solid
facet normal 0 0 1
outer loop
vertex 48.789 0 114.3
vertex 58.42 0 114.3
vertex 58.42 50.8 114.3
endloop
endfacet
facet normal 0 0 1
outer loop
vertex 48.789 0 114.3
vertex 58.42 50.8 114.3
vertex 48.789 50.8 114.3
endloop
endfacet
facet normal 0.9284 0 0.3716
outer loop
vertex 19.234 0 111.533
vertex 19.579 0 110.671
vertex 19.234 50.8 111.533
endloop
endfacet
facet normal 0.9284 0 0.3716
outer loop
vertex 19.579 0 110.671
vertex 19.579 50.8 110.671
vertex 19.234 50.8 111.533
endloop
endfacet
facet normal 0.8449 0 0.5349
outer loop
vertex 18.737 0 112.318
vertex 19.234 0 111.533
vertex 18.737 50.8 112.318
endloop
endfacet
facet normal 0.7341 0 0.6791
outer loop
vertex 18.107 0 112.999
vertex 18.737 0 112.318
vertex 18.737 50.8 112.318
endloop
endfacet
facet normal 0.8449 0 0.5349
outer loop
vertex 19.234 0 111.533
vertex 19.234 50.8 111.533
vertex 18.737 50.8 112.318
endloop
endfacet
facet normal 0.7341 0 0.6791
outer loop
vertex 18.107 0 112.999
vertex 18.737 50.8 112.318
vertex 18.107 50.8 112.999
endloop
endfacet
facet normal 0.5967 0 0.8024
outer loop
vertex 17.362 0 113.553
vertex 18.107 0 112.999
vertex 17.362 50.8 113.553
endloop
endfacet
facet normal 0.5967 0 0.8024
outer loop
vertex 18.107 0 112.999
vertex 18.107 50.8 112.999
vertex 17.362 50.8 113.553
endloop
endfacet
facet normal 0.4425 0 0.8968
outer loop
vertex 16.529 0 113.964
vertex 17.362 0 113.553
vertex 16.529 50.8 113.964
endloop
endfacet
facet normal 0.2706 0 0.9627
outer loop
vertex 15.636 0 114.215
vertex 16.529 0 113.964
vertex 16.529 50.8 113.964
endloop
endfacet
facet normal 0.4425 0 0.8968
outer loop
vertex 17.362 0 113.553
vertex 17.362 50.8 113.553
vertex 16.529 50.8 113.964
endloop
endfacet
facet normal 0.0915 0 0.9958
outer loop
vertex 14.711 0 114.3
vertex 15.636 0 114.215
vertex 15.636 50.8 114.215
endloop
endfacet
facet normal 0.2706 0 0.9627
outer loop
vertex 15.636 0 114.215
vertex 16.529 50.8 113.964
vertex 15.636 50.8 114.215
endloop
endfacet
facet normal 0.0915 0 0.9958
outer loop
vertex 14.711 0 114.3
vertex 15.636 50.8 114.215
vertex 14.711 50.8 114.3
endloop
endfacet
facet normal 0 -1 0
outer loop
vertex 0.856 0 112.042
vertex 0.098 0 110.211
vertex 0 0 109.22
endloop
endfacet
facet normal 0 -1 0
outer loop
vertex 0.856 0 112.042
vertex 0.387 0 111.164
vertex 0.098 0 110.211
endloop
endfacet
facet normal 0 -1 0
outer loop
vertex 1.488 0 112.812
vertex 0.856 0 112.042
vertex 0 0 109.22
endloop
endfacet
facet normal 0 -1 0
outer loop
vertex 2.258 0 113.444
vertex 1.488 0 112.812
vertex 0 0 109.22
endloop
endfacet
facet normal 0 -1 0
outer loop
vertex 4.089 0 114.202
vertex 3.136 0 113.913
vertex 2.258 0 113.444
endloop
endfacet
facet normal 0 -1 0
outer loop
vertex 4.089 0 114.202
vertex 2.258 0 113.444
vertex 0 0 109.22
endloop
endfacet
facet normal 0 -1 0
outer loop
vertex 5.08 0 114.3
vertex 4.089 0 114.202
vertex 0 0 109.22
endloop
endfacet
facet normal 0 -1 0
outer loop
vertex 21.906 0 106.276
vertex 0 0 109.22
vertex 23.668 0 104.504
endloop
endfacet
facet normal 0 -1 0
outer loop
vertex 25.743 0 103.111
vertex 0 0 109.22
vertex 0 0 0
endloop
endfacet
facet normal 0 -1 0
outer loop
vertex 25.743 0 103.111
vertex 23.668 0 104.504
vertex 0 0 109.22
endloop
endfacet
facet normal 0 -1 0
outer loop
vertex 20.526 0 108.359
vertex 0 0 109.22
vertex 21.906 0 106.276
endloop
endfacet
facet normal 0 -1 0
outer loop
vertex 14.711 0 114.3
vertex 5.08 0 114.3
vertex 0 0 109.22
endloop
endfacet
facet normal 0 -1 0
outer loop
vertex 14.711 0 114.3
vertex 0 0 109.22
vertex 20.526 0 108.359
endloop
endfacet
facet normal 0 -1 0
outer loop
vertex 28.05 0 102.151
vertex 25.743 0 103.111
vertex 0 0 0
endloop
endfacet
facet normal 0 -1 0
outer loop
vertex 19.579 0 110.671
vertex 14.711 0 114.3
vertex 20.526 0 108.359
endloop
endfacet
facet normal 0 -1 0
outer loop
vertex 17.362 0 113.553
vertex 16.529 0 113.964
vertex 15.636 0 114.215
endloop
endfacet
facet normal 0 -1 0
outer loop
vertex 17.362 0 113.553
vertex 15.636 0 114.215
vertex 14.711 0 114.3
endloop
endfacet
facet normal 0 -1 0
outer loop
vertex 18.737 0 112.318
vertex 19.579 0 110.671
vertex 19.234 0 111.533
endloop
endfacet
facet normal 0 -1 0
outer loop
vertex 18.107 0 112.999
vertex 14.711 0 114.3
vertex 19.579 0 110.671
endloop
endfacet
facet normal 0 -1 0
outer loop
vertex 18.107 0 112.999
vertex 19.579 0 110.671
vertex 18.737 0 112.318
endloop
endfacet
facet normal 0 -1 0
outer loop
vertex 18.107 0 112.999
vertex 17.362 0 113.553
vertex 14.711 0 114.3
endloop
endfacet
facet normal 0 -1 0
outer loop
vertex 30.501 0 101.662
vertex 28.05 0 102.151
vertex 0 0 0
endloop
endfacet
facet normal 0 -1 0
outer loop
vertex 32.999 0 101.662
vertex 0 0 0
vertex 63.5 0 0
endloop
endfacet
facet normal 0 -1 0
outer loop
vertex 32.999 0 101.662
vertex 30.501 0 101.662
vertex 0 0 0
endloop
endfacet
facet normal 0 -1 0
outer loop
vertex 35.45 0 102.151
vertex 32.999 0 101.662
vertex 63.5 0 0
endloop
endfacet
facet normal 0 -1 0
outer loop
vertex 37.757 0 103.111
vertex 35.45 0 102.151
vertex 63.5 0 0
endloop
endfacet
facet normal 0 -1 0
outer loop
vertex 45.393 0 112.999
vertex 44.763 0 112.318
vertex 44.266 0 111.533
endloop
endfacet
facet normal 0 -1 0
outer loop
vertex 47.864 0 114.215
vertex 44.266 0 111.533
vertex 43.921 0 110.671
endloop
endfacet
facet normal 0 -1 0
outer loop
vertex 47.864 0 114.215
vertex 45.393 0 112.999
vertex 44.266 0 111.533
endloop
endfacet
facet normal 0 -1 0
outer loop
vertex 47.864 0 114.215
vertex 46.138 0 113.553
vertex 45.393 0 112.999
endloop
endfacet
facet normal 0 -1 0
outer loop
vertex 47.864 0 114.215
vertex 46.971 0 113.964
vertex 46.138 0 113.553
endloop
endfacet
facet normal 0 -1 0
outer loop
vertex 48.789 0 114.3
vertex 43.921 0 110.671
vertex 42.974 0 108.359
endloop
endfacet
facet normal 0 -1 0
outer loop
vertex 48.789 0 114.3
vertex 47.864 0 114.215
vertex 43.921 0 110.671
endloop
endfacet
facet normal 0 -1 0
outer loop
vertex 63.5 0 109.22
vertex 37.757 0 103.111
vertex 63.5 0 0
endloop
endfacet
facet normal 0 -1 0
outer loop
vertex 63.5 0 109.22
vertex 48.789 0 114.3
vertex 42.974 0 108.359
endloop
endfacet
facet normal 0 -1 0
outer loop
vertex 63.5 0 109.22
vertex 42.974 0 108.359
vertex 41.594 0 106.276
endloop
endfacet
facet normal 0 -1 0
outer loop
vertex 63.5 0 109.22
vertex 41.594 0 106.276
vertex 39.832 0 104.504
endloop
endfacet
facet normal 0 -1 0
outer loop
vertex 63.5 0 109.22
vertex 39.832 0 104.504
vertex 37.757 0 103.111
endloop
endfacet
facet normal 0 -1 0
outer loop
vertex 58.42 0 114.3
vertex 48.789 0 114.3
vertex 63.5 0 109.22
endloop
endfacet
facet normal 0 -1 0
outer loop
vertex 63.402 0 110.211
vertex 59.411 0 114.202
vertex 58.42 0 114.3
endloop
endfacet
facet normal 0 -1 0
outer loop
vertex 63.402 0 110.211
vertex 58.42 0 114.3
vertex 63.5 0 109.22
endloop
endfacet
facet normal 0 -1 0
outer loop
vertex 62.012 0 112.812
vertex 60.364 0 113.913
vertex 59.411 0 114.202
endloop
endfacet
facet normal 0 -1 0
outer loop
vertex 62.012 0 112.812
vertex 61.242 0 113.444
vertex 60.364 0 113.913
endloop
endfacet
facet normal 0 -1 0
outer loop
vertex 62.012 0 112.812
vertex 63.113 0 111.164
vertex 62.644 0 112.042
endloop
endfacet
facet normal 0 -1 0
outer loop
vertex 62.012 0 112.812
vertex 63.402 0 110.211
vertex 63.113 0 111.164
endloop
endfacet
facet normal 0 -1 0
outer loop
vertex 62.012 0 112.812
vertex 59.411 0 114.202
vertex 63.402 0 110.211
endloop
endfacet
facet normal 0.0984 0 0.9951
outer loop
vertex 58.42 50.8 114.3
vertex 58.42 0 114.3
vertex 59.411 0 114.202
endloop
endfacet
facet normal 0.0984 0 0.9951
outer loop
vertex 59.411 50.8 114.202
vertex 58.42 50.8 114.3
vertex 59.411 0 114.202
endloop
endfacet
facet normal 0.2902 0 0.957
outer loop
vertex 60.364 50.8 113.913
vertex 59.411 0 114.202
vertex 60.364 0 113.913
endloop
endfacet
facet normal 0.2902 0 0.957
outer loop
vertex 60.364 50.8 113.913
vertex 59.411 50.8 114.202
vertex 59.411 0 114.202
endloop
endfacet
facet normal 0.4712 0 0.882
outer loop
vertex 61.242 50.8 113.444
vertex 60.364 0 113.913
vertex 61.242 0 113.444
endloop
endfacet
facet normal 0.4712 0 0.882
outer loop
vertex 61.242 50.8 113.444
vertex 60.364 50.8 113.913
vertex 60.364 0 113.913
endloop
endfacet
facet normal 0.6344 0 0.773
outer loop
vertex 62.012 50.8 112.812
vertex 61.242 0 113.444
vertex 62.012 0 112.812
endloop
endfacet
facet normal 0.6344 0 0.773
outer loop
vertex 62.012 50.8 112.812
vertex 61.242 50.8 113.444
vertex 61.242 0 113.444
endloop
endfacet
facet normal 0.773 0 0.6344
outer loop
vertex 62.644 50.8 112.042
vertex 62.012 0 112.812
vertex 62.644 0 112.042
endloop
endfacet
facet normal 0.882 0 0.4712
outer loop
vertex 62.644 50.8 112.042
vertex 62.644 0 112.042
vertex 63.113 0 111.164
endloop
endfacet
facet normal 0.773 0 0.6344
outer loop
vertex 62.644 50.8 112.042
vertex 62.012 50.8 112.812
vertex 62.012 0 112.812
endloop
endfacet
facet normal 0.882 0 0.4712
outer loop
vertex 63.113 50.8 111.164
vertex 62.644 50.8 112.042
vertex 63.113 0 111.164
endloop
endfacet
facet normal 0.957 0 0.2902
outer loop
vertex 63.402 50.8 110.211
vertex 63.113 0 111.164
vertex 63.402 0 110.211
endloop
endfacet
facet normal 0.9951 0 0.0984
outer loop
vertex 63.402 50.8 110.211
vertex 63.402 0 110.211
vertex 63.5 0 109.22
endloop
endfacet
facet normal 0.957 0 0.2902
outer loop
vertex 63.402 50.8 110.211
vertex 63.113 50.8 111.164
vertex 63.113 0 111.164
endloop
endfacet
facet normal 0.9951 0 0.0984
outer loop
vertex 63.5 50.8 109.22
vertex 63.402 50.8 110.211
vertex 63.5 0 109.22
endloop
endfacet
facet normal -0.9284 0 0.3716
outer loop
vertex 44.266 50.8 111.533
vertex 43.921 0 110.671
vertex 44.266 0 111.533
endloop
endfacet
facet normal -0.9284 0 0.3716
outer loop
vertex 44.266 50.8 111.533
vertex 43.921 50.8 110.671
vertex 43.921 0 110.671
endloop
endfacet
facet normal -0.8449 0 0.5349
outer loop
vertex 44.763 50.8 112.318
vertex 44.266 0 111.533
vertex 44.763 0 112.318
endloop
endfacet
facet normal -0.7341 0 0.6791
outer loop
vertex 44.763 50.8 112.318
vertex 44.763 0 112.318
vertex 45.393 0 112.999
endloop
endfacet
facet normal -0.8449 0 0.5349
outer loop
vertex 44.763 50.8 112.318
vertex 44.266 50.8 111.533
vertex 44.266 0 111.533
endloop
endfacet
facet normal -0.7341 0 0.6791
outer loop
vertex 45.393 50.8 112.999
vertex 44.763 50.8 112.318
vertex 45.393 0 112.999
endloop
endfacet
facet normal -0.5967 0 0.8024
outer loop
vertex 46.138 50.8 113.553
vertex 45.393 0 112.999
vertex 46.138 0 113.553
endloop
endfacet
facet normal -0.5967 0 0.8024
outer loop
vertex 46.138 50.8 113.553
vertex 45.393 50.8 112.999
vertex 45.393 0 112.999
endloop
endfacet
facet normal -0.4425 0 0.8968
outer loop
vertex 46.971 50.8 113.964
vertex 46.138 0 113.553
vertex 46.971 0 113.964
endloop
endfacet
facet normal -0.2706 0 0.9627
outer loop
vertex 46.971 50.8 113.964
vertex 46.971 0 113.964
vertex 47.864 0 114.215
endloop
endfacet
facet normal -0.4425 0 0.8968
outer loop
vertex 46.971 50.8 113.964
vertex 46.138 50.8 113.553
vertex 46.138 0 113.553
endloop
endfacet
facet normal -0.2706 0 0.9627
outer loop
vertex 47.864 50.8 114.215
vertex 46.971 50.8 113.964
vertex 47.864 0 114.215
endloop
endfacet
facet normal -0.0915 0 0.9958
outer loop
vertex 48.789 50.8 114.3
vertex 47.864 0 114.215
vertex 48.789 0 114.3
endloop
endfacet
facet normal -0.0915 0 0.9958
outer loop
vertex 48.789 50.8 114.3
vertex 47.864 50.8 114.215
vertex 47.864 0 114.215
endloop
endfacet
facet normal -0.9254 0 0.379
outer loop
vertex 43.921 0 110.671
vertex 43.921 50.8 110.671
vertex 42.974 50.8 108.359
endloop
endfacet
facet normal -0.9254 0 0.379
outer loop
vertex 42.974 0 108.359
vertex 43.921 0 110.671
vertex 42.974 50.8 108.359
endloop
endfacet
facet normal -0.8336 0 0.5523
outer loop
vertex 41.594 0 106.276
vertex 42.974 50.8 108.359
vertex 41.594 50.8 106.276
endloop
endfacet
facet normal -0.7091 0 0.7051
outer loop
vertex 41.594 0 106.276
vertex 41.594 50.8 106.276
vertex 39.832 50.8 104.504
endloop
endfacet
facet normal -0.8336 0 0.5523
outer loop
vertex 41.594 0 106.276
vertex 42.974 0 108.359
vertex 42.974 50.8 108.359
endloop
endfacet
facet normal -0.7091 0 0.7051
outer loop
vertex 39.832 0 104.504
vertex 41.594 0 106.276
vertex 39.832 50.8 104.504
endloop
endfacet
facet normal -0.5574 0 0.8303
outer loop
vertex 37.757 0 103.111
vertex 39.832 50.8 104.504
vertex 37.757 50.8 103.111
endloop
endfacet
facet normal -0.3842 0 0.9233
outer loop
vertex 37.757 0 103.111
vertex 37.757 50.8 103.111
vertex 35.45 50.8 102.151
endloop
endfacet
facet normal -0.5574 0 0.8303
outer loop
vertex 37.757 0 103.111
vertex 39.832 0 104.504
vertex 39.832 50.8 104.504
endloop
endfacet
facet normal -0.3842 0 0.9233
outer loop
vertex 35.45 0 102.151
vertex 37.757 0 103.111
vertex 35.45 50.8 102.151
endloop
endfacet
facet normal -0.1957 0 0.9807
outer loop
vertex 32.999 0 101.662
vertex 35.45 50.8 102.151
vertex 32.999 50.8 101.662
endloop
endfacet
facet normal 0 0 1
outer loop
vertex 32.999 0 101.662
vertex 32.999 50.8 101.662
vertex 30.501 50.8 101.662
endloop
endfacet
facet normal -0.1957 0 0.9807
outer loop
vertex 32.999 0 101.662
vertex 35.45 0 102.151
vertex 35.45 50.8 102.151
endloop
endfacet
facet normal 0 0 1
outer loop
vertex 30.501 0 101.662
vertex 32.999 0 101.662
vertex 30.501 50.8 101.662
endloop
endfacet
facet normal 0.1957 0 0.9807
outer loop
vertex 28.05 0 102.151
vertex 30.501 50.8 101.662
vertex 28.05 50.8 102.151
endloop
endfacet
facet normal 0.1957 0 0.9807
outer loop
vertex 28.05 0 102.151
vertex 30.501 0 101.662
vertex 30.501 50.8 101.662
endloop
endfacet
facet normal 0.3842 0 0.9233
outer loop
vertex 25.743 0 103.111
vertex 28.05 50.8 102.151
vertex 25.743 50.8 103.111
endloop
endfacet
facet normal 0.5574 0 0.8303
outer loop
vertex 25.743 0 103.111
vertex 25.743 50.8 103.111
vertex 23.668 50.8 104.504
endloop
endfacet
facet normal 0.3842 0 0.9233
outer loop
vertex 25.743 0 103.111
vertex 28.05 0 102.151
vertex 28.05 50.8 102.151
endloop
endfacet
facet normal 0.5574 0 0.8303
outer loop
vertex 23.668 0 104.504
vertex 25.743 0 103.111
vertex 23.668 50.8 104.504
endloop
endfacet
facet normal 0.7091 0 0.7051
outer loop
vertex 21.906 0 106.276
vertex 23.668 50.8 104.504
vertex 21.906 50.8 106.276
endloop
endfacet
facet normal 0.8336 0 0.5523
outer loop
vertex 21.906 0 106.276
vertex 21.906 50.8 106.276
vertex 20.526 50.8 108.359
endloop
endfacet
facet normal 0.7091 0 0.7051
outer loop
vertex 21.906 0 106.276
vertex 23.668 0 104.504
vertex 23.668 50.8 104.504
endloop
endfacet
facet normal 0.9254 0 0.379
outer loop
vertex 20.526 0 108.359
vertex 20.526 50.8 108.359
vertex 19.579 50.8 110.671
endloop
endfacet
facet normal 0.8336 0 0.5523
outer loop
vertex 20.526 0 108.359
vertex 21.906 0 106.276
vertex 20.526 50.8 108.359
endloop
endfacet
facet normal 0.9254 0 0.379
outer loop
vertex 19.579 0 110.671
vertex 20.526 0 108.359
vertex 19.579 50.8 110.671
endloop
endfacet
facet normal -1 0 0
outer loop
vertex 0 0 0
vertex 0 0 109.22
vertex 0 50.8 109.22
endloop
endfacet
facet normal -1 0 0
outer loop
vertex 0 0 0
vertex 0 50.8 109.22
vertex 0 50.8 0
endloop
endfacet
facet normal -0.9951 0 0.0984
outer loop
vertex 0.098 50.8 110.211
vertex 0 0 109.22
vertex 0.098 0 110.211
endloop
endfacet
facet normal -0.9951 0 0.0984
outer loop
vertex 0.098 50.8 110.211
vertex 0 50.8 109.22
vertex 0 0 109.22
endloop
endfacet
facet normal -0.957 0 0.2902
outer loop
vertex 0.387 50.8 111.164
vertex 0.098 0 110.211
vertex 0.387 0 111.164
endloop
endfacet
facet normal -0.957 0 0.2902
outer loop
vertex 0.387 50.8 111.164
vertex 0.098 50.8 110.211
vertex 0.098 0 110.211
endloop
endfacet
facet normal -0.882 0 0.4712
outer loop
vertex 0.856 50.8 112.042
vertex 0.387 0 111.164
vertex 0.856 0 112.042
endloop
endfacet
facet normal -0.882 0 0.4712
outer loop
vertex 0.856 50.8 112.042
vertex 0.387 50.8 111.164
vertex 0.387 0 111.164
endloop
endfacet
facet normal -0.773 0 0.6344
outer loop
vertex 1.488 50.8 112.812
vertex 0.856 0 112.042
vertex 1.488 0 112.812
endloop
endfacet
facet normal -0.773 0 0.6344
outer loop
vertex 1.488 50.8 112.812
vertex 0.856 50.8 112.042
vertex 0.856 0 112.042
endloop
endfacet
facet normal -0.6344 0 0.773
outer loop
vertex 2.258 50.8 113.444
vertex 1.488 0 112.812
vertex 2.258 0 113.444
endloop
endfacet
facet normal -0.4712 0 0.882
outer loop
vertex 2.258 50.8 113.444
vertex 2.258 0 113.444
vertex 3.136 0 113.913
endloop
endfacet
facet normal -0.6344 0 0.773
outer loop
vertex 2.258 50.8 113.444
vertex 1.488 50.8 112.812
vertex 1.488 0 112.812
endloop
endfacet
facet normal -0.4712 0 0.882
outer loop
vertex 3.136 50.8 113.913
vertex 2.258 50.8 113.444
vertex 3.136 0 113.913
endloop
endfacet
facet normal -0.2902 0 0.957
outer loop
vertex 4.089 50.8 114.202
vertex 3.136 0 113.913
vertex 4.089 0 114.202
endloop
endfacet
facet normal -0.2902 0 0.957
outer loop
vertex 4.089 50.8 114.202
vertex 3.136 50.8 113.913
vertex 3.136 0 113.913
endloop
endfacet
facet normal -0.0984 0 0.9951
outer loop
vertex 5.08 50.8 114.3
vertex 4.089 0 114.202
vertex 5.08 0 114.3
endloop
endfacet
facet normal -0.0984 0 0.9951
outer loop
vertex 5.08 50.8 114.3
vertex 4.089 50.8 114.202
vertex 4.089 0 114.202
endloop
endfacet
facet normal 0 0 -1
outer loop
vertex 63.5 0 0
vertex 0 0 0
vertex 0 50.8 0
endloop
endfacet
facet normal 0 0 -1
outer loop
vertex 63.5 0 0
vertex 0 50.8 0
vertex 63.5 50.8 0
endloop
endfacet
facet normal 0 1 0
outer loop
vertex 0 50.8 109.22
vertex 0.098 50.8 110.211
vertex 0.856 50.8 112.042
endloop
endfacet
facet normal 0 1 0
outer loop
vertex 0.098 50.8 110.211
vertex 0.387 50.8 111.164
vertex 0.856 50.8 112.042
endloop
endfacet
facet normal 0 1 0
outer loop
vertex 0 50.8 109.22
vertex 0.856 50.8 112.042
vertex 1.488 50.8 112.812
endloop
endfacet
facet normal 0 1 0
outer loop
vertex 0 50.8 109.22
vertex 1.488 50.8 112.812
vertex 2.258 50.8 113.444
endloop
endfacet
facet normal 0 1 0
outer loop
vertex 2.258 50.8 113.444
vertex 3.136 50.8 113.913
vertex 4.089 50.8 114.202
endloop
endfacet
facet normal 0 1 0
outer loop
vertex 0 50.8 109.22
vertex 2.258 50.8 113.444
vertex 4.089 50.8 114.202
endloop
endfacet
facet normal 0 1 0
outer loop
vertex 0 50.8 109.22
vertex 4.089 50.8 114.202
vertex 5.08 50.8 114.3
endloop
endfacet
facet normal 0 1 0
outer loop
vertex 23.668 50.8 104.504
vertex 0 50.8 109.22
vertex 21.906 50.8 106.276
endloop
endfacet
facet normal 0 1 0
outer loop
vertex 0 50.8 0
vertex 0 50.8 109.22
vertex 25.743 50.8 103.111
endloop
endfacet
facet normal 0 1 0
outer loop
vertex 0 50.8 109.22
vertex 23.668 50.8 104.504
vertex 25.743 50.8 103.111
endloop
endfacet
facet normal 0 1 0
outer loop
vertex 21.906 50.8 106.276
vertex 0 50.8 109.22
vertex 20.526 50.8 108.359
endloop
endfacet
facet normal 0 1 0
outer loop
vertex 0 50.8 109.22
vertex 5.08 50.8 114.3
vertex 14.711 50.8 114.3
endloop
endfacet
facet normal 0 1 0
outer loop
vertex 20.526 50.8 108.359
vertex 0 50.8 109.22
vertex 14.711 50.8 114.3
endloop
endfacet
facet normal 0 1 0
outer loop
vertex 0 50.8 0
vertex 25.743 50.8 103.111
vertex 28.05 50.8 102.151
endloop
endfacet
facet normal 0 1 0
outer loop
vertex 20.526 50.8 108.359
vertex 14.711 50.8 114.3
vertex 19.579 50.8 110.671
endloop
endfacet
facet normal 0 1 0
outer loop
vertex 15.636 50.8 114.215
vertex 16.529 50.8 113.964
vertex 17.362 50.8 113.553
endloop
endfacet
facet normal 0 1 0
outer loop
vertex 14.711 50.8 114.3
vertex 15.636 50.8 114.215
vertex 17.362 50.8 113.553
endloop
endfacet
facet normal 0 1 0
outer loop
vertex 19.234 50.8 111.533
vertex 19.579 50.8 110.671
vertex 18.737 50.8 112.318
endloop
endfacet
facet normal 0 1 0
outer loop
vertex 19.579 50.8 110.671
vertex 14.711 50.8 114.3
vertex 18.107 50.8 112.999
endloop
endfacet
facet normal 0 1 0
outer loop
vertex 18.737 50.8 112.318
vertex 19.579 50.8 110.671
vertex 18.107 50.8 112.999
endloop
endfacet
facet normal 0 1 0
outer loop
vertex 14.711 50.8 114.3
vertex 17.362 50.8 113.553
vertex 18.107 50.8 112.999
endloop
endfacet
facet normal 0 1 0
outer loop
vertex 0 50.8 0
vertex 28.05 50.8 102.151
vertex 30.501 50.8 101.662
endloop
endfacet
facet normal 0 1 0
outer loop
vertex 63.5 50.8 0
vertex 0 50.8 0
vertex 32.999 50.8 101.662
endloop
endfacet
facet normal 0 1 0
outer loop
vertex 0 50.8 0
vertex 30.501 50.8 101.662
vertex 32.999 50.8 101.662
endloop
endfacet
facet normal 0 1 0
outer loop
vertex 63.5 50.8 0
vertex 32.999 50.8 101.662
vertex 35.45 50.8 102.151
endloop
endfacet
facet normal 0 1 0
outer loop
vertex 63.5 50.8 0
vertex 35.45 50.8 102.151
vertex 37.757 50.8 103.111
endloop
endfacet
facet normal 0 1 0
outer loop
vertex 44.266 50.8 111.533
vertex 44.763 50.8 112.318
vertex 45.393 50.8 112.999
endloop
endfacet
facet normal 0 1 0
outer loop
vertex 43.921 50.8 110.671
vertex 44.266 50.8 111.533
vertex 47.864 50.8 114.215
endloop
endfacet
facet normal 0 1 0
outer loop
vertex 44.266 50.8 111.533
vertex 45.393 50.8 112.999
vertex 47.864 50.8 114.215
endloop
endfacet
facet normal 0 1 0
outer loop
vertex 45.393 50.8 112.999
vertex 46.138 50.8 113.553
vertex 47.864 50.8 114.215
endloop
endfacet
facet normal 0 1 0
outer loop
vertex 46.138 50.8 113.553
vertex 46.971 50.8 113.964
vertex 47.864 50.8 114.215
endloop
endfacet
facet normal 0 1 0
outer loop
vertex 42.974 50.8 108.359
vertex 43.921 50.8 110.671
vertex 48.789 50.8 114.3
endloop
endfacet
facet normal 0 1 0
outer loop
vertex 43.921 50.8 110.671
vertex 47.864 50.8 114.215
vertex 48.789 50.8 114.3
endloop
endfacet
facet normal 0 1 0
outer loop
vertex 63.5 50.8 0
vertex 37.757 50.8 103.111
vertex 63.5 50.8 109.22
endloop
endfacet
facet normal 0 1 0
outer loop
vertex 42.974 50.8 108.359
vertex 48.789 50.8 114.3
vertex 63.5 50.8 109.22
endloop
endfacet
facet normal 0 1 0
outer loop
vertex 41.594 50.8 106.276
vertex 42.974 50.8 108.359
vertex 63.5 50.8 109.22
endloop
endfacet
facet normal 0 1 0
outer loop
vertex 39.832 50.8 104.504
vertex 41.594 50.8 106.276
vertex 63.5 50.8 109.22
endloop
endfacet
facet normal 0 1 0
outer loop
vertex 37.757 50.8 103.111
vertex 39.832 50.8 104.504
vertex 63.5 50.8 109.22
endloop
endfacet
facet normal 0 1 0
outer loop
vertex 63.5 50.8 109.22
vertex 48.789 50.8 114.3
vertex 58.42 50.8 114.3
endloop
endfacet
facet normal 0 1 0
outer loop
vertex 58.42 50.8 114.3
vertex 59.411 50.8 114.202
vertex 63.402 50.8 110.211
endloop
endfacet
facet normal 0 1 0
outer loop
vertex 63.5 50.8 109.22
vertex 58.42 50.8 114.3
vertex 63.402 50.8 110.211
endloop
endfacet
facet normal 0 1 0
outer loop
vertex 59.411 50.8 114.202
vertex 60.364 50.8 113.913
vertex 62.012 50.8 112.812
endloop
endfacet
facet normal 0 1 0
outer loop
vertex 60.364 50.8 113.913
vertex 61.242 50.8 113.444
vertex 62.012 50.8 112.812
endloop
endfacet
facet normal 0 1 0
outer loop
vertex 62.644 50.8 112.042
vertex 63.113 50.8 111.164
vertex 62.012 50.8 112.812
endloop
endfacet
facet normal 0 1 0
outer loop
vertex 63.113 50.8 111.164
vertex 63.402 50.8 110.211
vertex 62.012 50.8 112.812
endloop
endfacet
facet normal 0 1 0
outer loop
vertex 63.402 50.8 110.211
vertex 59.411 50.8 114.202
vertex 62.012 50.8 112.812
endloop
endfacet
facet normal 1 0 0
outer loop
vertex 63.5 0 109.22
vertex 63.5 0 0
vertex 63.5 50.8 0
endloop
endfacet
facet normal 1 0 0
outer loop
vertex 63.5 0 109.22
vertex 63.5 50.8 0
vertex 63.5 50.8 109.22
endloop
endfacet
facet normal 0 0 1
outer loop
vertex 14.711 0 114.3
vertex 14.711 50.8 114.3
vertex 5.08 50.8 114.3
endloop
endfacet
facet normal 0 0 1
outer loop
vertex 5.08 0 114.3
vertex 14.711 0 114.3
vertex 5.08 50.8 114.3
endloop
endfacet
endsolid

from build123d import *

# Parameters (mm, degrees)
F1_DEPTH = 50.8
F2_R     = 5.08
F3_R     = 5.08
F4_R     = 5.08
F5_R     = 5.08


with BuildPart() as f1:
    # F0 (on Front) → F1 (new body)
    with BuildSketch(Plane.XZ):
        with BuildLine():
            Line((0, 114.3), (0, 0))
            Line((0, 0), (63.5, 0))
            Line((63.5, 0), (63.5, 114.3))
            Line((63.5, 114.3), (44.45, 114.3))
            ThreePointArc((44.45, 114.3), (31.75, 101.6), (19.05, 114.3))
            Line((19.05, 114.3), (0, 114.3))
        make_face()
    extrude(amount=-F1_DEPTH)

    # F2
    f2_edges = [f1.edges().sort_by_distance(p)[0] for p in [
        (19.05, 25.4, 114.3),
    ]]
    fillet(f2_edges, radius=F2_R)

    # F3
    f3_edges = [f1.edges().sort_by_distance(p)[0] for p in [
        (44.45, 25.4, 114.3),
    ]]
    fillet(f3_edges, radius=F3_R)

    # F4
    f4_edges = [f1.edges().sort_by_distance(p)[0] for p in [
        (63.5, 25.4, 114.3),
    ]]
    fillet(f4_edges, radius=F4_R)

    # F5
    f5_edges = [f1.edges().sort_by_distance(p)[0] for p in [
        (0, 25.4, 114.3),
    ]]
    fillet(f5_edges, radius=F5_R)


solid = f1.part
